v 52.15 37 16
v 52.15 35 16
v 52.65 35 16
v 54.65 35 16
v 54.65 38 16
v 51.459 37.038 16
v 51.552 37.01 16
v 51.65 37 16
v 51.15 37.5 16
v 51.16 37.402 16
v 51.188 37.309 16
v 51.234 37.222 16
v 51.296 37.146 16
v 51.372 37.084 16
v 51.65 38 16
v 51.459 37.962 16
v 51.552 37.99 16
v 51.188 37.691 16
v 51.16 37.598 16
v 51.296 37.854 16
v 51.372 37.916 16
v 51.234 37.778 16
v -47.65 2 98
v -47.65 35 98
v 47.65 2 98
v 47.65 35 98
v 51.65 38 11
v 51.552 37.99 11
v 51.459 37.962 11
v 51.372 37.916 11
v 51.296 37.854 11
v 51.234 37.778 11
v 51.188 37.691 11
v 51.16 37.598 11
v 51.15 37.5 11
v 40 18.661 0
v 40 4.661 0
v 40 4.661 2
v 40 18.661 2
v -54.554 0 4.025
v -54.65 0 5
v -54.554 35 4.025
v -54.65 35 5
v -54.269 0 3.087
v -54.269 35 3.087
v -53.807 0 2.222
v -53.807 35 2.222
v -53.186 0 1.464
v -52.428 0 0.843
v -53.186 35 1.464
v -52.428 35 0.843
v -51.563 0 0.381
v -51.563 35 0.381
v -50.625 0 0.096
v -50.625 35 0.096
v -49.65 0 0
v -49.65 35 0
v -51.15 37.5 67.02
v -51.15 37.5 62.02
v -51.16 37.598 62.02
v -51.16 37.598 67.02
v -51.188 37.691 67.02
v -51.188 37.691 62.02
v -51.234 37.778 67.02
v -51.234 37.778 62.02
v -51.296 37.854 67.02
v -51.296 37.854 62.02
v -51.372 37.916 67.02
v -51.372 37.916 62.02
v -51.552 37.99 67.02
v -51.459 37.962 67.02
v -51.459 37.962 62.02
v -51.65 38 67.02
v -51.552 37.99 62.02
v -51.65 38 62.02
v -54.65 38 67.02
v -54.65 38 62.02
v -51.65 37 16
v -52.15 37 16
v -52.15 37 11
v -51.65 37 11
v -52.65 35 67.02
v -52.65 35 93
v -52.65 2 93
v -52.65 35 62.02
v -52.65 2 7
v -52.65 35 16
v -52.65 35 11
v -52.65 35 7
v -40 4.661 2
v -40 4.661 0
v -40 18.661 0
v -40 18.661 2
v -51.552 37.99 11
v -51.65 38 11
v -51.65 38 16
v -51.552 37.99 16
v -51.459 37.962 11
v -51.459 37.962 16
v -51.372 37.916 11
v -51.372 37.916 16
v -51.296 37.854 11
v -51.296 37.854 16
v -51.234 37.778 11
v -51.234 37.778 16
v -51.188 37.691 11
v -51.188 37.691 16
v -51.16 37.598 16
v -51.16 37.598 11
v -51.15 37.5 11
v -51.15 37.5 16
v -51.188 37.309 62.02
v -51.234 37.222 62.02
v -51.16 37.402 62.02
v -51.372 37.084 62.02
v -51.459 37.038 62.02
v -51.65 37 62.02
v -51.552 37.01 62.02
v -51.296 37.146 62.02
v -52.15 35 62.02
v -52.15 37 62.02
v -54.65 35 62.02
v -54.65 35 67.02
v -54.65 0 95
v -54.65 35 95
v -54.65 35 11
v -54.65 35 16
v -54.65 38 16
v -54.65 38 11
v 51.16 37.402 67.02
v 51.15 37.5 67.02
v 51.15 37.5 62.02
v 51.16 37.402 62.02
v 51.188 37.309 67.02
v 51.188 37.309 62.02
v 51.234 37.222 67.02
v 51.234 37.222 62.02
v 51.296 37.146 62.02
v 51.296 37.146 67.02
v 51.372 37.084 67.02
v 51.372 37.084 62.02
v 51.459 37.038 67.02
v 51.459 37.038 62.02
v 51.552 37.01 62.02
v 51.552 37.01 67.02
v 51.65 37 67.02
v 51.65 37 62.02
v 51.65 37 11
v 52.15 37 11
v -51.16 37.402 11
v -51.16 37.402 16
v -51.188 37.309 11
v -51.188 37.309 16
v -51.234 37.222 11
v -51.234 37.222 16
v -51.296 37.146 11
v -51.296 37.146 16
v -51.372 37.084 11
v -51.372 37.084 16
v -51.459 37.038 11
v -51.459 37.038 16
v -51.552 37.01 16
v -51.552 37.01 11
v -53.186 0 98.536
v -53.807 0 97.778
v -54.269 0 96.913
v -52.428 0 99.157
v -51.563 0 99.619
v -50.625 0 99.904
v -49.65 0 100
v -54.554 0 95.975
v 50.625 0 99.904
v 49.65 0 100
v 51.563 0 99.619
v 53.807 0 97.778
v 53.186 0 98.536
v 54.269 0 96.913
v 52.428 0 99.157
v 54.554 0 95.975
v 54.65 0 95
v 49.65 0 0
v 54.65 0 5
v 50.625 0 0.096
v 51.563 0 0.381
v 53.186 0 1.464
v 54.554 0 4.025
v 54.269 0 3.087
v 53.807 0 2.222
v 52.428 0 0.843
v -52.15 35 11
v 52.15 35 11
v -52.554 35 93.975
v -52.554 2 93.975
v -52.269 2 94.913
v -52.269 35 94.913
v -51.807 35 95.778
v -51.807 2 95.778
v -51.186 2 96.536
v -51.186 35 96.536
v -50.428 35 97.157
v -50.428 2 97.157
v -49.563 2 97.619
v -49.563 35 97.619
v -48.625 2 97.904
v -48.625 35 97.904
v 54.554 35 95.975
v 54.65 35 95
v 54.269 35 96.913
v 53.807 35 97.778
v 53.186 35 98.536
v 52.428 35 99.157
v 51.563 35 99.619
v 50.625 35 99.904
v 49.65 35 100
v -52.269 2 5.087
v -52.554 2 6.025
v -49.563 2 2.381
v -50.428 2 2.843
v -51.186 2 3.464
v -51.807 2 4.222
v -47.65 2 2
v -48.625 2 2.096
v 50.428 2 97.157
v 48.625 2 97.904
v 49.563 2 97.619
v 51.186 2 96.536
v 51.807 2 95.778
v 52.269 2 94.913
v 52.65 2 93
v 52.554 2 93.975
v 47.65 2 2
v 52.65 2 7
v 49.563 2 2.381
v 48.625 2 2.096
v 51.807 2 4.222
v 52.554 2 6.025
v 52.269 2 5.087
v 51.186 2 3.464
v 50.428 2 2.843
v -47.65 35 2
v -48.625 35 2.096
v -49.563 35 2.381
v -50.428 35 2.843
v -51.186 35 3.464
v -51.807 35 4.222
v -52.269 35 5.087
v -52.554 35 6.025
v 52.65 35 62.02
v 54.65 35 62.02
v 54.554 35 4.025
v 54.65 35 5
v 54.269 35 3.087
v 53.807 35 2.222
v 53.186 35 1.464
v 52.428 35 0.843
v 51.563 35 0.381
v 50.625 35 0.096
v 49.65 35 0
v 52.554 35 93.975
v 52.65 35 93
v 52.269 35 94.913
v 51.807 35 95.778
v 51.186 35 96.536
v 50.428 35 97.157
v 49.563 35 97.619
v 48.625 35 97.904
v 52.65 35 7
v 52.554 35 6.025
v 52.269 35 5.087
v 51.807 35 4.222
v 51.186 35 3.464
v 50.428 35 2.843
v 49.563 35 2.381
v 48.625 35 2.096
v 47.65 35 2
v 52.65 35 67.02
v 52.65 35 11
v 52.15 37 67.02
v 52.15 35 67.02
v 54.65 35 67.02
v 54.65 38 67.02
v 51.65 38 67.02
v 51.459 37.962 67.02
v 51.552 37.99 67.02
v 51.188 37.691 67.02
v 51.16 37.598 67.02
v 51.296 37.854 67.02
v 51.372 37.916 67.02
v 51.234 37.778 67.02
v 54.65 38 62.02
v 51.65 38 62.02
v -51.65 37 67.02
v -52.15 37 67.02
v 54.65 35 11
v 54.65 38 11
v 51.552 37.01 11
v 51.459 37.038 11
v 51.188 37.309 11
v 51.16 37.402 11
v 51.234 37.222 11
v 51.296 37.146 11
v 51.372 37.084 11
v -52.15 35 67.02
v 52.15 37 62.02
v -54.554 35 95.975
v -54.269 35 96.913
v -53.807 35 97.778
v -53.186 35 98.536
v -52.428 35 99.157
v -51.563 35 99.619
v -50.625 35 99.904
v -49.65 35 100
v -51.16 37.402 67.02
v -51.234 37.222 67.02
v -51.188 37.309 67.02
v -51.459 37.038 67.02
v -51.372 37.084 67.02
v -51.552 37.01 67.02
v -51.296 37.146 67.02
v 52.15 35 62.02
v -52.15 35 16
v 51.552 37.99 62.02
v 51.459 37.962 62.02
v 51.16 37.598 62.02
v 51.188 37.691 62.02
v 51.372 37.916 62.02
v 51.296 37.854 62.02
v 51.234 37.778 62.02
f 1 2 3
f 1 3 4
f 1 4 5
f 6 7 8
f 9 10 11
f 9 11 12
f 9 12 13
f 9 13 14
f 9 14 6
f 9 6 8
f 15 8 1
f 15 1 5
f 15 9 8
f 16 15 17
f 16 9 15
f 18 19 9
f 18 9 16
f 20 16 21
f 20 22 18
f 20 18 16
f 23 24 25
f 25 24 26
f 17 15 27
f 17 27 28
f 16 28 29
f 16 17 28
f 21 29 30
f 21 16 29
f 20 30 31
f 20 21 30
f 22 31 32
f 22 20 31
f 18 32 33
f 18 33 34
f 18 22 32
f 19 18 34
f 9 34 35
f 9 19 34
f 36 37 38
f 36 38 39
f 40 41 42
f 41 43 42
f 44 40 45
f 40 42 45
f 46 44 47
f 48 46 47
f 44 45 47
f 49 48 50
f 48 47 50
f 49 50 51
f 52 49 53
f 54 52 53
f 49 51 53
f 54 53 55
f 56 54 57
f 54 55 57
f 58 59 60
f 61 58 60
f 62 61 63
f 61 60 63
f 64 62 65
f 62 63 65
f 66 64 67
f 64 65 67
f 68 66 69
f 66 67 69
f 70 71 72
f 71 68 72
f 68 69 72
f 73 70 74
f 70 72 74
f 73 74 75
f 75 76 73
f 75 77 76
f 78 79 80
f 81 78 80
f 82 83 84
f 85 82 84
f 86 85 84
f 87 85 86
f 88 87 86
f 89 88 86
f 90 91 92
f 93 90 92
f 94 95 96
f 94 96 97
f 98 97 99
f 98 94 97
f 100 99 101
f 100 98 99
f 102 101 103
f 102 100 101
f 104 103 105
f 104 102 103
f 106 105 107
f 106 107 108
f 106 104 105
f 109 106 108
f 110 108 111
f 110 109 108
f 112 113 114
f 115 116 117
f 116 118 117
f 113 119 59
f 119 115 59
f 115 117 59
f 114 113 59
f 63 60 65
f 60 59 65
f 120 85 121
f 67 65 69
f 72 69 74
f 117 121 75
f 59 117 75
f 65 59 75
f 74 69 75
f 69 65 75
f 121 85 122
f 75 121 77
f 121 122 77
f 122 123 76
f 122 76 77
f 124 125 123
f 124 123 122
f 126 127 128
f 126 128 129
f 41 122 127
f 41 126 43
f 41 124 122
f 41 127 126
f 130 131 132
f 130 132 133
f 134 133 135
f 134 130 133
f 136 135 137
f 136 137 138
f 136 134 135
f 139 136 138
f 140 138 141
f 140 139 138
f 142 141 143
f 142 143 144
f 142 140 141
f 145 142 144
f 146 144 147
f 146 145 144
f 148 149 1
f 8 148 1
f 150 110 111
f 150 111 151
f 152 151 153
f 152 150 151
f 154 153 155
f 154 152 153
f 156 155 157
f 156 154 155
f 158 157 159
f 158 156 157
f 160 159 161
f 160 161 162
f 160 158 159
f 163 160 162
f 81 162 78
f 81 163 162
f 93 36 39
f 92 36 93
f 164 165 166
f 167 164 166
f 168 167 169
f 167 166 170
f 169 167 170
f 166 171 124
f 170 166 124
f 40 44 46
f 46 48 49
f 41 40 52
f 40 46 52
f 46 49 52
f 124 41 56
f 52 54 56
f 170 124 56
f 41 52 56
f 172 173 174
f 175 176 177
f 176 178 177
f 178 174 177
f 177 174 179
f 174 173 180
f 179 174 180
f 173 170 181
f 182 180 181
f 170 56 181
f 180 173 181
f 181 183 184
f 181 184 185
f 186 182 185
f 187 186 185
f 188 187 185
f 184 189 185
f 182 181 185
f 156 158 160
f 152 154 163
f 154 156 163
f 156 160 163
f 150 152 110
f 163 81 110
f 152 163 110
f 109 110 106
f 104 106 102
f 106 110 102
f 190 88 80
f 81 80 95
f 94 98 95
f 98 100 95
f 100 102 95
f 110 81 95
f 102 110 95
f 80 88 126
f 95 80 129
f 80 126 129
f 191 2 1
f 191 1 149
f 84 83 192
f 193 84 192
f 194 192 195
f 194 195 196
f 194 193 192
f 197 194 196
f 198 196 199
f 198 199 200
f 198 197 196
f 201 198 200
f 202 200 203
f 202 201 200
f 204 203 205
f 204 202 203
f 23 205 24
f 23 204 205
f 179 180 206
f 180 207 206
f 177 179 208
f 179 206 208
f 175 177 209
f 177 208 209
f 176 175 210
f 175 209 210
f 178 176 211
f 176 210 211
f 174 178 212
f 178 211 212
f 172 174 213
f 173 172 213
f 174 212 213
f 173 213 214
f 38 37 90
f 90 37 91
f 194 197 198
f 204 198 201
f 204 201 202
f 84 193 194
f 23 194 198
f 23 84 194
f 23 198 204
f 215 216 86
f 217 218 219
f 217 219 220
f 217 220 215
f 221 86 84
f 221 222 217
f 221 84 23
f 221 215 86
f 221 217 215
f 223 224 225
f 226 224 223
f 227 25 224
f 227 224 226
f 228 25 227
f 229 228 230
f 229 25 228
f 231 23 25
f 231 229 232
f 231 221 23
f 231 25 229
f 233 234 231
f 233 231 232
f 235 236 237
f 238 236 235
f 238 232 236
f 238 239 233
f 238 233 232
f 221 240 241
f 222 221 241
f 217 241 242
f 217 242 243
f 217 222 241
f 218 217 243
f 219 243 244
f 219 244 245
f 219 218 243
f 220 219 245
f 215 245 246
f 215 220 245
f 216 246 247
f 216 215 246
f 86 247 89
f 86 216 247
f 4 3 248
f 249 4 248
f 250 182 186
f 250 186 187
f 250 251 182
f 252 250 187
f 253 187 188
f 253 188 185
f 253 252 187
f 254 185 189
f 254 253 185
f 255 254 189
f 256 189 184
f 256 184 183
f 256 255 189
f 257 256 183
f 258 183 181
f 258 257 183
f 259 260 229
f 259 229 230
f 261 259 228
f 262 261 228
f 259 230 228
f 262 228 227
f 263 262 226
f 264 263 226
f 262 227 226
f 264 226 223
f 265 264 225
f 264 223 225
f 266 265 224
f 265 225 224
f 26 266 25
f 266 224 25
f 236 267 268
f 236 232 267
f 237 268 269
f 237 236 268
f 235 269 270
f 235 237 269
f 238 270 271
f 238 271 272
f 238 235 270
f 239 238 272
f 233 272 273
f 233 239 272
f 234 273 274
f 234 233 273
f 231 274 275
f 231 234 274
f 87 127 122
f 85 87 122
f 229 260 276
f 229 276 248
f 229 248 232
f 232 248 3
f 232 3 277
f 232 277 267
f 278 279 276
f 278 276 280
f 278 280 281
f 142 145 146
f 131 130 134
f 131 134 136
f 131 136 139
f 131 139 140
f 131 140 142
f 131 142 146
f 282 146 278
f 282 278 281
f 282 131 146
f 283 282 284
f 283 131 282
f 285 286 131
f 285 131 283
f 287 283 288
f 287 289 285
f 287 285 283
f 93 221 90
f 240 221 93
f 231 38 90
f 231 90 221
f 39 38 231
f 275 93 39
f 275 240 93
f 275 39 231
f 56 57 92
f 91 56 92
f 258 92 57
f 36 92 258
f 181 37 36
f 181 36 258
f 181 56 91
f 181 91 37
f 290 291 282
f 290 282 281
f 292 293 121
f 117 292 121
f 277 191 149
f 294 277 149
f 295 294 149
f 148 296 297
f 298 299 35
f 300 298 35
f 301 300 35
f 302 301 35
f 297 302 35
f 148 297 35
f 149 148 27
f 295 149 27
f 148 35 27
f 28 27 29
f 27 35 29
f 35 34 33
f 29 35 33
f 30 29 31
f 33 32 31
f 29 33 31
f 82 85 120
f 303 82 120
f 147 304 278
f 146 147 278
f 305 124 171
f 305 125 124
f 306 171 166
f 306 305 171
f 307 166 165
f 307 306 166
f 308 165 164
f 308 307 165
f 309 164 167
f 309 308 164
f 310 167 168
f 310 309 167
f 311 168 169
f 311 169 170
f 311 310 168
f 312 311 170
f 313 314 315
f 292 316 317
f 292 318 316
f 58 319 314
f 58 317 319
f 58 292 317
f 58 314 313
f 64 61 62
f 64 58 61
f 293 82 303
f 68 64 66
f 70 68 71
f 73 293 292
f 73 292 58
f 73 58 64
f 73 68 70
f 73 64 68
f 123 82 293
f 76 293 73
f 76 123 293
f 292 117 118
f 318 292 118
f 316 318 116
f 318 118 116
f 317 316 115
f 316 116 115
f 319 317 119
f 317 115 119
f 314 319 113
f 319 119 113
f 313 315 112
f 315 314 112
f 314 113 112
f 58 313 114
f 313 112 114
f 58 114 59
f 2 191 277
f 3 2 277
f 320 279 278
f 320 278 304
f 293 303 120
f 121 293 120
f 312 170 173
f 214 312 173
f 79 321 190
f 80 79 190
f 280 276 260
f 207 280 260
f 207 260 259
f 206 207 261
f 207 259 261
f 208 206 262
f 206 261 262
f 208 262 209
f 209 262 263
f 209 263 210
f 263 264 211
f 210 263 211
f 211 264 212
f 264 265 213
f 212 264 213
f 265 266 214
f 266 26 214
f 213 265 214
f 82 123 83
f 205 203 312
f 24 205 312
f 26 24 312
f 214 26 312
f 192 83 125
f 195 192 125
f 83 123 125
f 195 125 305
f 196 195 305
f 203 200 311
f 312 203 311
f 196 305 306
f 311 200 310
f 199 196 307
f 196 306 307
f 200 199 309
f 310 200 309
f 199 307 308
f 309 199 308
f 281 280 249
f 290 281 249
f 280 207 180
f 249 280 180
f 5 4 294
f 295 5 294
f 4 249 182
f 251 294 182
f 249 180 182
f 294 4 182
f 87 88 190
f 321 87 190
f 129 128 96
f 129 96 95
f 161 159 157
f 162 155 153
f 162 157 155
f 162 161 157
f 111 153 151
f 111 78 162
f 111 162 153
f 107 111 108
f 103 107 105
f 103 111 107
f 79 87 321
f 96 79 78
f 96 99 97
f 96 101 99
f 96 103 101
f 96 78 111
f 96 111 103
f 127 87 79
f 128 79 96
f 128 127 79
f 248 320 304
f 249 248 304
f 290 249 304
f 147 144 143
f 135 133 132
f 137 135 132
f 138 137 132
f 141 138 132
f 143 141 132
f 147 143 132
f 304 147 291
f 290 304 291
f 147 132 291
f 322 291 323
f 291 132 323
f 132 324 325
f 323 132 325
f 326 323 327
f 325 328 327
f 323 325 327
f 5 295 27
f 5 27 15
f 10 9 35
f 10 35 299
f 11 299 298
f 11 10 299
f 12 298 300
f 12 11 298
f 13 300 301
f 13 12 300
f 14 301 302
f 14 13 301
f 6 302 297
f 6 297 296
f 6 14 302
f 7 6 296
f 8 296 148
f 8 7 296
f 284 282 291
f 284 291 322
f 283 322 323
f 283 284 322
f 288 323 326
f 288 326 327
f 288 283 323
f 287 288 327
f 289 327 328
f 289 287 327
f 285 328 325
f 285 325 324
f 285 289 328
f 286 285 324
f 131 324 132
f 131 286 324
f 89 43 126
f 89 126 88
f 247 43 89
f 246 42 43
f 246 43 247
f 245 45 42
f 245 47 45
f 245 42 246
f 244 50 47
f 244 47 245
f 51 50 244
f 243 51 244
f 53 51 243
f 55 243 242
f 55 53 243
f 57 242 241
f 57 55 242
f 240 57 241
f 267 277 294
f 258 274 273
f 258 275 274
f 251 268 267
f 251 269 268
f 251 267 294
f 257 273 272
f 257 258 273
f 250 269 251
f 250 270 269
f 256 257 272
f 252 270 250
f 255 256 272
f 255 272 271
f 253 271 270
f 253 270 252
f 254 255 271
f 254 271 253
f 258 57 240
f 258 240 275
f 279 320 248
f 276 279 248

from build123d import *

# Parameters (mm, degrees)
SKETCH1_W           = 109.3
SKETCH1_H           = 100
BOSS_EXTRUDE1_DEPTH = 35
SKETCH2_W           = 2.5
SKETCH2_H           = 7
BOSS_EXTRUDE2_DEPTH = 3
SKETCH3_W           = 7
SKETCH3_H           = 1
BOSS_EXTRUDE3_DEPTH = 1
SKETCH4_W           = 7
SKETCH4_H           = 1
BOSS_EXTRUDE4_DEPTH = 1
FILLET1_R           = 0.5
SKETCH5_W           = 105.3
SKETCH5_H           = 96
CUT_EXTRUDE1_DEPTH  = 33
FILLET2_R           = 5
SKETCH6_W           = 1
SKETCH6_H           = 3
CUT_EXTRUDE2_DEPTH  = 153.939497841
CUT_EXTRUDE3_REACH  = 122.128
SKETCH7_W           = 80
SKETCH7_H           = 14


with BuildPart() as part:
    # Sketch1 → Boss-Extrude1 (new body)
    with BuildSketch(Plane(origin=(0, 0, 0), x_dir=(1, 0, 0), z_dir=(0, 1, 0))):
        with Locations((0, -50)):
            Rectangle(SKETCH1_W, SKETCH1_H)
    extrude(amount=BOSS_EXTRUDE1_DEPTH)

    # Sketch2 → Boss-Extrude2 (add)
    with BuildSketch(Plane(origin=(0, 35, 0), x_dir=(1, 0, 0), z_dir=(0, 1, 0))):
        with Locations((-53.4, -13.5)):
            Rectangle(SKETCH2_W, SKETCH2_H)
        with Locations((53.4, -13.5)):
            Rectangle(SKETCH2_W, SKETCH2_H)
        with Locations((53.4, -64.52)):
            Rectangle(SKETCH2_W, SKETCH2_H)
        with Locations((-53.4, -64.52)):
            Rectangle(SKETCH2_W, SKETCH2_H)
    extrude(amount=BOSS_EXTRUDE2_DEPTH)

    # Sketch3 → Boss-Extrude3 (add)
    with BuildSketch(Plane(origin=(-52.15, 0, 0), x_dir=(0, 0, -1), z_dir=(1, 0, 0))):
        with Locations((-13.5, 37.5)):
            Rectangle(SKETCH3_W, SKETCH3_H)
        with Locations((-64.52, 37.5)):
            Rectangle(SKETCH3_W, SKETCH3_H)
    extrude(amount=BOSS_EXTRUDE3_DEPTH)

    # Sketch4 → Boss-Extrude4 (add)
    with BuildSketch(Plane.ZY.offset(-52.15)):
        with Locations((13.5, 37.5)):
            Rectangle(SKETCH4_W, SKETCH4_H)
        with Locations((64.52, 37.5)):
            Rectangle(SKETCH4_W, SKETCH4_H)
    extrude(amount=BOSS_EXTRUDE4_DEPTH)

    # Fillet1
    fillet1_edges = [part.edges().sort_by_distance(p)[0] for p in [
        (51.15, 38, 13.5),
        (51.15, 37, 13.5),
        (51.15, 37, 64.52),
        (51.15, 38, 64.52),
        (-51.15, 37, 13.5),
        (-51.15, 38, 13.5),
        (-51.15, 37, 64.52),
        (-51.15, 38, 64.52),
    ]]
    fillet(fillet1_edges, radius=FILLET1_R - 0.0001)  # a hair under: the kernel refuses the full size

    # Sketch5 → Cut-Extrude1 (cut)
    with BuildSketch(Plane(origin=(0, 35, 0), x_dir=(1, 0, 0), z_dir=(0, 1, 0))):
        with Locations((0, -50)):
            Rectangle(SKETCH5_W, SKETCH5_H)
    extrude(amount=-CUT_EXTRUDE1_DEPTH, mode=Mode.SUBTRACT)

    # Fillet2
    fillet2_edges = [part.edges().sort_by_distance(p)[0] for p in [
        (-52.65, 18.5, 98),
        (-52.65, 18.5, 2),
        (52.65, 18.5, 2),
        (52.65, 18.5, 98),
        (-54.65, 17.5, 0),
        (54.65, 17.5, 0),
        (54.65, 17.5, 100),
        (-54.65, 17.5, 100),
    ]]
    fillet(fillet2_edges, radius=FILLET2_R)

    # Sketch6 → Cut-Extrude2 (cut, through all)
    with BuildSketch(Plane.ZY.offset(54.65)):
        with Locations((10.5, 36.5)):
            Rectangle(SKETCH6_W, SKETCH6_H)
        with Locations((16.5, 36.5)):
            Rectangle(SKETCH6_W, SKETCH6_H)
        with Locations((61.52, 36.5)):
            Rectangle(SKETCH6_W, SKETCH6_H)
        with Locations((67.52, 36.5)):
            Rectangle(SKETCH6_W, SKETCH6_H)
    extrude(amount=-CUT_EXTRUDE2_DEPTH, mode=Mode.SUBTRACT)

    # Sketch7 → Cut-Extrude3 (cut, up to next)
    with BuildSketch(Plane(origin=(0, 0, 0), x_dir=(-1, 0, 0), z_dir=(0, 0, -1)), mode=Mode.PRIVATE) as cut_extrude3_sk1:
        with Locations((0, 11.66099816)):
            Rectangle(SKETCH7_W, SKETCH7_H)
    cut_extrude3_tool1 = extrude(cut_extrude3_sk1.sketch, amount=-CUT_EXTRUDE3_REACH, mode=Mode.PRIVATE) & part.part
    add(cut_extrude3_tool1.solids().sort_by_distance((0, 11.660998, 0))[0], mode=Mode.SUBTRACT)


solid = part.part
